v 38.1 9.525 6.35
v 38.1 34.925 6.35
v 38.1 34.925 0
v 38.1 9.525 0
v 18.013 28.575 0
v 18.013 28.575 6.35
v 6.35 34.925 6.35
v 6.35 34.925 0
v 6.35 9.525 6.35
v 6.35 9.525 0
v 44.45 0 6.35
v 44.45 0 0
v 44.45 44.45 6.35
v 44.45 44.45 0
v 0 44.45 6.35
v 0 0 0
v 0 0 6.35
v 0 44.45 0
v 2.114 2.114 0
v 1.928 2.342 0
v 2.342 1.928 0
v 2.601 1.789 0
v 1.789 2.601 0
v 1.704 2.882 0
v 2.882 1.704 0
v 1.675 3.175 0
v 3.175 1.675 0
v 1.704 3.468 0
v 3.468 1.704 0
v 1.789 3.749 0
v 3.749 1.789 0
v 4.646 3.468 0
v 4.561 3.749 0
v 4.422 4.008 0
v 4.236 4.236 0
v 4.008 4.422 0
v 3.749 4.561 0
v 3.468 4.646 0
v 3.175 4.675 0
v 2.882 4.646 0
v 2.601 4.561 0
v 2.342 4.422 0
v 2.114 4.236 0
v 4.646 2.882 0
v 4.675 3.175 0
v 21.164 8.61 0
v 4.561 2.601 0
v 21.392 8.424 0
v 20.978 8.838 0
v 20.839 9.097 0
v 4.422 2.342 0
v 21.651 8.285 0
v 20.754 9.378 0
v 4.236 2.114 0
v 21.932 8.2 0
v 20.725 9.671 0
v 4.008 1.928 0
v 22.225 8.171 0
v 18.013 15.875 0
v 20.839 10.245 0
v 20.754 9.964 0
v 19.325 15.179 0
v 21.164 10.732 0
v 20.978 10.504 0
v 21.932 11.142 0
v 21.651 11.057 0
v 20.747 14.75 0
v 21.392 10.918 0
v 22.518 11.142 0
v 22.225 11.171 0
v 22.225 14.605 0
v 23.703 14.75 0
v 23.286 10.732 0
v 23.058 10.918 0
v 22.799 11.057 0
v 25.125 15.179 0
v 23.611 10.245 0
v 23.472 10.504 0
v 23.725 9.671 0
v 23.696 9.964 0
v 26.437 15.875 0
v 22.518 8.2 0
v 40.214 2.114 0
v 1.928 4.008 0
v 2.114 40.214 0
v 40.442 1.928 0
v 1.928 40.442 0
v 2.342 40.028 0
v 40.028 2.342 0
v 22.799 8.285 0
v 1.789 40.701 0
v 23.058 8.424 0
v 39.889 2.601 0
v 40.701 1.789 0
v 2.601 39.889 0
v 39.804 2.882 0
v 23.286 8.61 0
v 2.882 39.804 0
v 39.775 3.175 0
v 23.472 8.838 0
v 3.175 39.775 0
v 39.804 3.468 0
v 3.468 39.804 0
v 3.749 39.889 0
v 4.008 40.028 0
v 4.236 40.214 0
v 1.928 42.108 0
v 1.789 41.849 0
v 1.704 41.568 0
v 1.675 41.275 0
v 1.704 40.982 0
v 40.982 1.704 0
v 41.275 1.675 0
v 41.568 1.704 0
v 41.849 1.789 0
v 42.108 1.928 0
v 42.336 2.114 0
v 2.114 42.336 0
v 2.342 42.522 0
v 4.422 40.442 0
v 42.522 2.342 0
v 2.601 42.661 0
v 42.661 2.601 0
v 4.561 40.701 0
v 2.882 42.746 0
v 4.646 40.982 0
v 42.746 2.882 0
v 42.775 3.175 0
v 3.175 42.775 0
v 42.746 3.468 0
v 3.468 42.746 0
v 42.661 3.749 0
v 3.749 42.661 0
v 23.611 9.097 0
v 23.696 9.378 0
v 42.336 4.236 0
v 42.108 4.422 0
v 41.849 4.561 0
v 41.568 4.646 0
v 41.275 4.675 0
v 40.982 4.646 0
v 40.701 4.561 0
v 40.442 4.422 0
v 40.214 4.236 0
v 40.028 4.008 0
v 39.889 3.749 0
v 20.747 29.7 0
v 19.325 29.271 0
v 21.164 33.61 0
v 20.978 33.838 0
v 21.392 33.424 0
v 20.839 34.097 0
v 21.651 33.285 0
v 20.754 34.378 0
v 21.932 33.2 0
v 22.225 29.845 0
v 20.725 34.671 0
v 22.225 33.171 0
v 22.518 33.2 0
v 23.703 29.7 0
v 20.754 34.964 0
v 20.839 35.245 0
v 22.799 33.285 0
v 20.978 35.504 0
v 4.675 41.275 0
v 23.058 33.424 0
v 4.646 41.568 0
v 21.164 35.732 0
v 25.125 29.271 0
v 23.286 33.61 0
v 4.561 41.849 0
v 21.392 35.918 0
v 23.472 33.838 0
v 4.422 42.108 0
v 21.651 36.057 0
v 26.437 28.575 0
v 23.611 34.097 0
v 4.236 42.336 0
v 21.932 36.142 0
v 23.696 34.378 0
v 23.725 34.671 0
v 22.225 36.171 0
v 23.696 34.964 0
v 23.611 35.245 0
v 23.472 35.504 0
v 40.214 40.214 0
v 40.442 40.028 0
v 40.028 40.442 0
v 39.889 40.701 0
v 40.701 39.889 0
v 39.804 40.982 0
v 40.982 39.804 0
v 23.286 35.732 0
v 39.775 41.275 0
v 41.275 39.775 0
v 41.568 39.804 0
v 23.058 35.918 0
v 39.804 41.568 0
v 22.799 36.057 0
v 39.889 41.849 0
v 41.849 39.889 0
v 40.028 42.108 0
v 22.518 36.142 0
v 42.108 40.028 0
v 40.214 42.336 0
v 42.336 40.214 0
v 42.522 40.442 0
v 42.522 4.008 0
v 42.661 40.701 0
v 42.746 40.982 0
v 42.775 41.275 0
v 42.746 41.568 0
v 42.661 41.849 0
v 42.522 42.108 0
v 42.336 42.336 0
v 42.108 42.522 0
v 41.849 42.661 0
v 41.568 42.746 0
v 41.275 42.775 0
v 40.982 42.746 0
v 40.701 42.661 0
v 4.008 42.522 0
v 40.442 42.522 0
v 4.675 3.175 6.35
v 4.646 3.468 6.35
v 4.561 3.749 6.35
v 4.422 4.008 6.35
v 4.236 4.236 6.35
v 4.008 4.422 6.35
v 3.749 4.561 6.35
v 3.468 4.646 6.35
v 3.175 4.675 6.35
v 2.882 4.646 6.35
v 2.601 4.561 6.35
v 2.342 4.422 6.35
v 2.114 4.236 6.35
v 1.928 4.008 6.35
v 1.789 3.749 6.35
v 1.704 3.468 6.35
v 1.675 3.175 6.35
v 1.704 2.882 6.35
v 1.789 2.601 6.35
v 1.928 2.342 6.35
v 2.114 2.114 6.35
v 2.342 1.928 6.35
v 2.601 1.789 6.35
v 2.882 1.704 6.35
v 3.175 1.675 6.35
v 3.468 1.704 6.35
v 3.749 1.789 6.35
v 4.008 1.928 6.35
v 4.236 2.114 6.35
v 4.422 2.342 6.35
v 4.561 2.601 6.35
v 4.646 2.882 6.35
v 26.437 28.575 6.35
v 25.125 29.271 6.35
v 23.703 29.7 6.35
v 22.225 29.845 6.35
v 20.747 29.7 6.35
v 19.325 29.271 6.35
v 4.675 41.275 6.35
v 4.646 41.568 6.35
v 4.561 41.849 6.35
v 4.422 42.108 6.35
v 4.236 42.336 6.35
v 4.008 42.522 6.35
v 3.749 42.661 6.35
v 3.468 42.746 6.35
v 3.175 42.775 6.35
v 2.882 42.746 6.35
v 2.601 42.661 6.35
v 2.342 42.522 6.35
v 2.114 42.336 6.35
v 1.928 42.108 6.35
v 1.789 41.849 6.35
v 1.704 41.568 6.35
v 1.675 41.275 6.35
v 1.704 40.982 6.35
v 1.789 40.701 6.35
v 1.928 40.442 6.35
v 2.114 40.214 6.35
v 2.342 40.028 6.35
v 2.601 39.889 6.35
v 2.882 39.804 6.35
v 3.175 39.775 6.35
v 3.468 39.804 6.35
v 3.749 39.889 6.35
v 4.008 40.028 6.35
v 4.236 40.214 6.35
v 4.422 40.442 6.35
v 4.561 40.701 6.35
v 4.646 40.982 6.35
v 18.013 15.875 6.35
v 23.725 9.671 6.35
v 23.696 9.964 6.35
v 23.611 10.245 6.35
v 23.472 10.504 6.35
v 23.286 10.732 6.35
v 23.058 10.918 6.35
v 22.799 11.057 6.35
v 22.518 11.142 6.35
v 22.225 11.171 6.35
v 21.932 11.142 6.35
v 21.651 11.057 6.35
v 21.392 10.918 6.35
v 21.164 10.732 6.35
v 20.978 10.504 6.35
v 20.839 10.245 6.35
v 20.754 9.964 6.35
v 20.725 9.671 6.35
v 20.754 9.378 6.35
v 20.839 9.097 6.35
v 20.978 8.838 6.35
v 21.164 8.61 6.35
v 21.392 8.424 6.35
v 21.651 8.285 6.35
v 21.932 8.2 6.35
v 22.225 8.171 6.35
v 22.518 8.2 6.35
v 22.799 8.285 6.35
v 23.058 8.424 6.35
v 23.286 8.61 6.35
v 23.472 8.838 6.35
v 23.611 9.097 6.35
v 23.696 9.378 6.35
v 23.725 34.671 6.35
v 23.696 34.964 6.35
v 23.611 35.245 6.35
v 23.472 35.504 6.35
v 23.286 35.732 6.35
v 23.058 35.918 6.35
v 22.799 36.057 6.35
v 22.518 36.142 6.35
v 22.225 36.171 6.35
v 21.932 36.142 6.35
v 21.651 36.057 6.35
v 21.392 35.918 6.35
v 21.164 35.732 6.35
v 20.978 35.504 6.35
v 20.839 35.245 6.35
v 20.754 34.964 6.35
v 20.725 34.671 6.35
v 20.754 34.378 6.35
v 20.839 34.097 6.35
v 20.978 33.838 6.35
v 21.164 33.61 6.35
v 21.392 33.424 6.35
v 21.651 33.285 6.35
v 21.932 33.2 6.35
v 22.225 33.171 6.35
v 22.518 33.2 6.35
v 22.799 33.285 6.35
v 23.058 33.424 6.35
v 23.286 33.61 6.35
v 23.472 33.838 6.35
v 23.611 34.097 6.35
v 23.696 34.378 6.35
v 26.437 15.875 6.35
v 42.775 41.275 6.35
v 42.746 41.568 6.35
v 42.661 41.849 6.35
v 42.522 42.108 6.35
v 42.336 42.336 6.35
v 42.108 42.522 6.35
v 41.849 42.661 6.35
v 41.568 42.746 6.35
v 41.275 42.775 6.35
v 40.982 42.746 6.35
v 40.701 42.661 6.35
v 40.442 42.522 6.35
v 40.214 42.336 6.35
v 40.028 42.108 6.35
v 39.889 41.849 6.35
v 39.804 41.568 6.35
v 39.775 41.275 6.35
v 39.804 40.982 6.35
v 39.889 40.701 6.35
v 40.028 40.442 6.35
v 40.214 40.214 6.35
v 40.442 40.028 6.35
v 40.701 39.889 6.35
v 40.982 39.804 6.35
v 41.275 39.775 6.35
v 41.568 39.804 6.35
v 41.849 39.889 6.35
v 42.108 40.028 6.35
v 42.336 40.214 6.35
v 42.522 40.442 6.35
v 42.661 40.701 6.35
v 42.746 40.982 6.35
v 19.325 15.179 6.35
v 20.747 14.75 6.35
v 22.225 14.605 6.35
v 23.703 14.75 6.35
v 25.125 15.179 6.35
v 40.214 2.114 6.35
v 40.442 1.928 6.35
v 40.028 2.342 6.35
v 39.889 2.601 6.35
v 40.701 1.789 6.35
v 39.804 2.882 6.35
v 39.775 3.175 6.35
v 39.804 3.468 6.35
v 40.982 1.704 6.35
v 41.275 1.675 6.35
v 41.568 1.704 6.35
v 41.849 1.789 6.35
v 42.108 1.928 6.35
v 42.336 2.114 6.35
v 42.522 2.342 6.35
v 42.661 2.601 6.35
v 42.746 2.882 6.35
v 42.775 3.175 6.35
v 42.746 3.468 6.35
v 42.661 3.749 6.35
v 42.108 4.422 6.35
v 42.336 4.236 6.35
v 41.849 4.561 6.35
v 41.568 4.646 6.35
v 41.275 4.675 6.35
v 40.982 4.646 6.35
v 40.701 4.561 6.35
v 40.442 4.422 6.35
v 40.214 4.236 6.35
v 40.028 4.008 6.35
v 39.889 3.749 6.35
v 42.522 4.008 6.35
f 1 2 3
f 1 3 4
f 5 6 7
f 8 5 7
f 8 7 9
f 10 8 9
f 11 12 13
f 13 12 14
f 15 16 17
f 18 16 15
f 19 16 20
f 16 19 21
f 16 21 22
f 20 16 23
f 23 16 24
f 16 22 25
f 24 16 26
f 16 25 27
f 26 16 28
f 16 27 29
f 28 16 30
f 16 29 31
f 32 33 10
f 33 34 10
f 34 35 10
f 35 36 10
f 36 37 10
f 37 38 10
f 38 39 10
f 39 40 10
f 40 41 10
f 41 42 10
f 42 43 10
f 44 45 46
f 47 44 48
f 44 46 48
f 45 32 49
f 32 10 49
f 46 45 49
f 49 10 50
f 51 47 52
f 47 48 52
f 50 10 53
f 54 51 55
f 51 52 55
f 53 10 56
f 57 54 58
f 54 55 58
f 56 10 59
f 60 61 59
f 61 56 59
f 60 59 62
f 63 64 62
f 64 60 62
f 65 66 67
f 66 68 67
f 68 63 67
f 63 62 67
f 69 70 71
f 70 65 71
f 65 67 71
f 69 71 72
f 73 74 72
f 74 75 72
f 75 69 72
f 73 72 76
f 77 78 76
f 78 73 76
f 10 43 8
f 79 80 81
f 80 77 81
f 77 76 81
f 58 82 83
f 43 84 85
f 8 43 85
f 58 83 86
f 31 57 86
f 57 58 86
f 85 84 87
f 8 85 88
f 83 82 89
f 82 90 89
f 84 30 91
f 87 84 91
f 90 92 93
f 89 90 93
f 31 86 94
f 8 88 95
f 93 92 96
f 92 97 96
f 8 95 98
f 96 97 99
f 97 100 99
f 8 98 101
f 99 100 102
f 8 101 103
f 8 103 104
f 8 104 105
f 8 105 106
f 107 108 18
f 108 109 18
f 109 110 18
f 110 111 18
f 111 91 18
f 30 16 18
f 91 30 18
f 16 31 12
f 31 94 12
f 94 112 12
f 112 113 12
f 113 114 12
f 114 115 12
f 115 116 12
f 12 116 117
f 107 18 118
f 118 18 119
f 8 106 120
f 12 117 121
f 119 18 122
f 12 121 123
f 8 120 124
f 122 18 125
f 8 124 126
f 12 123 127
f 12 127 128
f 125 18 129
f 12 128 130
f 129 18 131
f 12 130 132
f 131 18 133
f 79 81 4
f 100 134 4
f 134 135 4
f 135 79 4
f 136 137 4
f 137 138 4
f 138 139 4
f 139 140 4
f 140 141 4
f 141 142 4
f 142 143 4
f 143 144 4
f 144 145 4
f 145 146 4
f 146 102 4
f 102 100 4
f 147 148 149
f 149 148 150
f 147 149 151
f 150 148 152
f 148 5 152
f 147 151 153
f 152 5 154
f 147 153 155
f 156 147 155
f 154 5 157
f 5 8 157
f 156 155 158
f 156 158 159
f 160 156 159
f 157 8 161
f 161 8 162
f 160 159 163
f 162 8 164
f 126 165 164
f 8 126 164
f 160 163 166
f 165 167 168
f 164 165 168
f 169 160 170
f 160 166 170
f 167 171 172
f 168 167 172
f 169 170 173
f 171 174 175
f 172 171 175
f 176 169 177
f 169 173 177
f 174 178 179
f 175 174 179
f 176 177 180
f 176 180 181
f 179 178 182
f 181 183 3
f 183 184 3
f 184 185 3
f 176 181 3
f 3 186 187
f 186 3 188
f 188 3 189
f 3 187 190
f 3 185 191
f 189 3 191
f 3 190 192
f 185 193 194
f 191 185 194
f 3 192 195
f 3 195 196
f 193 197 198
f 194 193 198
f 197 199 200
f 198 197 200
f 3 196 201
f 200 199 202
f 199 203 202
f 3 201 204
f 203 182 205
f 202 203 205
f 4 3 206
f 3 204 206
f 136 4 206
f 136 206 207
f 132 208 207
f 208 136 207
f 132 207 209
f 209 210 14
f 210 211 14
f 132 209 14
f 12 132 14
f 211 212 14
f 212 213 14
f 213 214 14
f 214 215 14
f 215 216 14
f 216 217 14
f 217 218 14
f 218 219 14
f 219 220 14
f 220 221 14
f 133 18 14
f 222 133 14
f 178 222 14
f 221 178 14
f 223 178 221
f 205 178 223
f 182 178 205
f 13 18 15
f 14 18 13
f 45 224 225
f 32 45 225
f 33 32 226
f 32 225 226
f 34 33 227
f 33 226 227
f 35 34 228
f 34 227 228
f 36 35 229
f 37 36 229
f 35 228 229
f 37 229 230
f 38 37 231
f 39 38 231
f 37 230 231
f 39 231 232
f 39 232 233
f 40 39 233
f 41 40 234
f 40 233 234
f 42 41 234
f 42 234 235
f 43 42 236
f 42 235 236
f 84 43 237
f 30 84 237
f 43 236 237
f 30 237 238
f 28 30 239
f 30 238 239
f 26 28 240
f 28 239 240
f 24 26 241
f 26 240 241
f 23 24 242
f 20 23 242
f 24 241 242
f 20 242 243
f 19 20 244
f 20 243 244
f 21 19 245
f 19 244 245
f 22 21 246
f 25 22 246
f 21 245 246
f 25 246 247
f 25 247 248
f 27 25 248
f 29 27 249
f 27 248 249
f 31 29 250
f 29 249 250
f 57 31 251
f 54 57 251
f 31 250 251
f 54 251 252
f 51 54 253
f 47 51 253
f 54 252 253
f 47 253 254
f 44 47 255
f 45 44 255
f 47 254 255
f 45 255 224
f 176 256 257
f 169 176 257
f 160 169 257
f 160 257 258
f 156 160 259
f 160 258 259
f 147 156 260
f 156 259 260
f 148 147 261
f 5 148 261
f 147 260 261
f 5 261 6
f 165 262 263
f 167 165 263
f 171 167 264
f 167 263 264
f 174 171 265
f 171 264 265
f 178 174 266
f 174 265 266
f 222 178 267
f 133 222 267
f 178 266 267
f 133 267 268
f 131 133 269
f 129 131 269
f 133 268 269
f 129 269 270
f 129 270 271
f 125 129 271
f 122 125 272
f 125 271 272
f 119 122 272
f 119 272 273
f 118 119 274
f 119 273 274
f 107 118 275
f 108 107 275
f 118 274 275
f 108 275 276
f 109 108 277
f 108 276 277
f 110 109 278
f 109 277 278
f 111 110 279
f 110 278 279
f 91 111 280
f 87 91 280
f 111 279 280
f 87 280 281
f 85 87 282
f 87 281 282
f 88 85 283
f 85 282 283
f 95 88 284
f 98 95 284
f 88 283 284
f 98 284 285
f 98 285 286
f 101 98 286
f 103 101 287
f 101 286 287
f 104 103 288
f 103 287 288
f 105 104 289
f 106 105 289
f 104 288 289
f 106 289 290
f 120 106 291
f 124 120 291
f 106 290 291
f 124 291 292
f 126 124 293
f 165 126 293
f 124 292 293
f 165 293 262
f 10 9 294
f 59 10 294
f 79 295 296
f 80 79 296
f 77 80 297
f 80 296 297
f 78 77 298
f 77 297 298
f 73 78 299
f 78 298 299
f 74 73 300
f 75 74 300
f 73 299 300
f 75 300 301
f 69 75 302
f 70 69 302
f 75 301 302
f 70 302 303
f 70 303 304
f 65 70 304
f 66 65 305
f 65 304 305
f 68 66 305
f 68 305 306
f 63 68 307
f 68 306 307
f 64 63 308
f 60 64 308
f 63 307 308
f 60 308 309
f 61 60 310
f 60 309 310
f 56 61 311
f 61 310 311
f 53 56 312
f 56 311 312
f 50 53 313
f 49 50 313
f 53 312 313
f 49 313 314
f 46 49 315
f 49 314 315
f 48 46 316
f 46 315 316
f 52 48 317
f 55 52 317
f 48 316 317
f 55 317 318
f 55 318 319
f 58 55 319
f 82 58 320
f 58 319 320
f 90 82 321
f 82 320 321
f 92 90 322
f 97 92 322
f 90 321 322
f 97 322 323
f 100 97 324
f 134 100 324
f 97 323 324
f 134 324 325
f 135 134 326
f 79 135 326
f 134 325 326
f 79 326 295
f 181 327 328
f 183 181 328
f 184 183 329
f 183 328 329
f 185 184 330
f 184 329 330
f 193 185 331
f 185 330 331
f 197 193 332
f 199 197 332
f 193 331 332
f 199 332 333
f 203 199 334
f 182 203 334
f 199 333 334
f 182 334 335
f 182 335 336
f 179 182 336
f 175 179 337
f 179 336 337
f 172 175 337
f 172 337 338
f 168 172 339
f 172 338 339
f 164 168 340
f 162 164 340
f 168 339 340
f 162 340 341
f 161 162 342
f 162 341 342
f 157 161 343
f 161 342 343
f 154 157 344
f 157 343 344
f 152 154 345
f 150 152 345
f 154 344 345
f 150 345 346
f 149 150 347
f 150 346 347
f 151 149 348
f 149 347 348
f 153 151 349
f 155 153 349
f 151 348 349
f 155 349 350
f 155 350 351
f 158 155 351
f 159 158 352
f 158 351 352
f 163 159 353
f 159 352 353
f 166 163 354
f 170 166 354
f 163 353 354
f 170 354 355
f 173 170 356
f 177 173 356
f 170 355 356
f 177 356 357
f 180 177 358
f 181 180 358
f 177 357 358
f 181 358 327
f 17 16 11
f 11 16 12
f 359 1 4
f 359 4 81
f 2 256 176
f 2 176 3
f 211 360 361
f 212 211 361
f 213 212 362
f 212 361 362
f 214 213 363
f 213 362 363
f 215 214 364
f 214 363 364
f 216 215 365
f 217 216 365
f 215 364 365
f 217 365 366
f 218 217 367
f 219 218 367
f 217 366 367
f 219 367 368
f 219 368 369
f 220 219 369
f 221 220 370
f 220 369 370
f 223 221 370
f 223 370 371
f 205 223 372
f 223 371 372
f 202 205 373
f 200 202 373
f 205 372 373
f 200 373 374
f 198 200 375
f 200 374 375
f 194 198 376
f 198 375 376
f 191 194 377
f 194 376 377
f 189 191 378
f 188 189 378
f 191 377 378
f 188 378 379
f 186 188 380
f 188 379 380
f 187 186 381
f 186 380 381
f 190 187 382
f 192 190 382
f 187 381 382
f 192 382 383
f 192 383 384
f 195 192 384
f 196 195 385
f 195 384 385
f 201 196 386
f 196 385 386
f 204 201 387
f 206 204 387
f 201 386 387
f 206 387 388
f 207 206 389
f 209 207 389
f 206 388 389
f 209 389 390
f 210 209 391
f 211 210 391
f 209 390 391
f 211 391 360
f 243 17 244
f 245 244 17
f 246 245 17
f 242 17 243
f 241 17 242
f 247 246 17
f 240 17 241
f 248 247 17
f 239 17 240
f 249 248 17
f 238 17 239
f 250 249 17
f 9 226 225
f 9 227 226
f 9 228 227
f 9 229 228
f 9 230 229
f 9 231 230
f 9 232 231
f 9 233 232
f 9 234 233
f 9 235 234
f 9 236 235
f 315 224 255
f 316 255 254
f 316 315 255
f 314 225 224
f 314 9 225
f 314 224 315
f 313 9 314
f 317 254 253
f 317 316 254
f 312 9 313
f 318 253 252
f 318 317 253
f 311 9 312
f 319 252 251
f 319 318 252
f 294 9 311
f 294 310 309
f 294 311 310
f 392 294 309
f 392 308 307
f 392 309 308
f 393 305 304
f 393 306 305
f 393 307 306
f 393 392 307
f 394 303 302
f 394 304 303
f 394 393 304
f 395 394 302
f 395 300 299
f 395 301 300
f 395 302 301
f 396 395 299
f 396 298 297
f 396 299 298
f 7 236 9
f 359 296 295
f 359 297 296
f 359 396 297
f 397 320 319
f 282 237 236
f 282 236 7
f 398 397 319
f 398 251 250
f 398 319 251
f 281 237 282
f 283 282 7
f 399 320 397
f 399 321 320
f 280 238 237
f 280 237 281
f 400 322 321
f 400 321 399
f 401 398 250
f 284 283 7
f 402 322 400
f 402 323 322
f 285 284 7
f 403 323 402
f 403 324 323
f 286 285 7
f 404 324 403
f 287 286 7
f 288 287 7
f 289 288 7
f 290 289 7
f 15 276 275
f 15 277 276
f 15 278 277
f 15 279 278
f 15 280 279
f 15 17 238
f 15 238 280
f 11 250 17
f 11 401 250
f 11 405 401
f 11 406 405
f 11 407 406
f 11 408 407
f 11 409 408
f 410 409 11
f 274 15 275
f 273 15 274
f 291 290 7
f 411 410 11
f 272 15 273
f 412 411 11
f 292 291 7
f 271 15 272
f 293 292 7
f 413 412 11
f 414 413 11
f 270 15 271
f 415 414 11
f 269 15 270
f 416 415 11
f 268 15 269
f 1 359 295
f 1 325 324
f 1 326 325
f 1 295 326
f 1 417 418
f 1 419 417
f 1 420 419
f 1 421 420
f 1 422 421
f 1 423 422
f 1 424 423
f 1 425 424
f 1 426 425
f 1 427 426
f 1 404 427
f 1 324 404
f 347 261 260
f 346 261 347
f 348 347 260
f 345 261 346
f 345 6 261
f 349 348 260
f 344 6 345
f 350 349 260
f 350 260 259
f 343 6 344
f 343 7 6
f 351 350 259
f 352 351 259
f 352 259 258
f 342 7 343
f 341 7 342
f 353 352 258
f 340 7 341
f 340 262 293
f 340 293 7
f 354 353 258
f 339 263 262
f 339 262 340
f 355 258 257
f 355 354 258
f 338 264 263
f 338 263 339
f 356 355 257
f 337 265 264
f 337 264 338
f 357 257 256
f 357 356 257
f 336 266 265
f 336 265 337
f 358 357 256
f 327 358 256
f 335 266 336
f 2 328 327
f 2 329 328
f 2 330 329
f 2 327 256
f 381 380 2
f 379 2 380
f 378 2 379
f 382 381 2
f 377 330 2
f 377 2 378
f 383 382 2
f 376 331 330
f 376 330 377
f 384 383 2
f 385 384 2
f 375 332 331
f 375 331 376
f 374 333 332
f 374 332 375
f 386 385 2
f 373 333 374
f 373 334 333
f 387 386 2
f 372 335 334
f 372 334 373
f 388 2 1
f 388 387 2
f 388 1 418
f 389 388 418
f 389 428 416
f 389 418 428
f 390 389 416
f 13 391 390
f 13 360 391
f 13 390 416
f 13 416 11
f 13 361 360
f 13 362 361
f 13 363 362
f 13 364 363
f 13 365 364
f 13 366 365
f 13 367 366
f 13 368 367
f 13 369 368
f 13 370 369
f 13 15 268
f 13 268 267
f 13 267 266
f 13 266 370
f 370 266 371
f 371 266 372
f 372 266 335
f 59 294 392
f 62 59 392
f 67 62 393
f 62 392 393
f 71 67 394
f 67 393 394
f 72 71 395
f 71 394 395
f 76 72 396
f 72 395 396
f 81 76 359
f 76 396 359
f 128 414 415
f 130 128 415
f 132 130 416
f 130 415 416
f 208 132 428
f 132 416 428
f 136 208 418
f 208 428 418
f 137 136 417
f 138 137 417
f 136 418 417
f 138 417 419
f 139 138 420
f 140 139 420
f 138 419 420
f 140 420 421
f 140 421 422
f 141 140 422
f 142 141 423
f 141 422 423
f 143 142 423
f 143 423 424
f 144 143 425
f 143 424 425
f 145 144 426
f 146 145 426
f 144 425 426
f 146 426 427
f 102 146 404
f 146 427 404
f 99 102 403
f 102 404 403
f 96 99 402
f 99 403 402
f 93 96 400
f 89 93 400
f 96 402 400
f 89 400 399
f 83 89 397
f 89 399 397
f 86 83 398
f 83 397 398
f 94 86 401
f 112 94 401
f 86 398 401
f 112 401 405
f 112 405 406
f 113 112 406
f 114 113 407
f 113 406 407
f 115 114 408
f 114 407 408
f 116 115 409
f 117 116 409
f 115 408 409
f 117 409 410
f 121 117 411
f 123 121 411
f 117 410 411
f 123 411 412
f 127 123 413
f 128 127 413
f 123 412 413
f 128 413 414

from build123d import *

# Parameters (mm, degrees)
SKETCH1_W           = 44.45
SKETCH1_H           = 44.45
BOSS_EXTRUDE1_DEPTH = 6.35
SKETCH2_R           = 1.5
CUT_EXTRUDE2_DEPTH  = 6.35
SKETCH3_R           = 7.62
CUT_EXTRUDE3_DEPTH  = 6.35
SKETCH4_R           = 1.5
CUT_EXTRUDE4_DEPTH  = 6.35
CUT_EXTRUDE5_DEPTH  = 6.35


with BuildPart() as part:
    # Sketch1 → Boss-Extrude1 (new body)
    with BuildSketch(Plane.XY):
        with Locations((22.225, 22.225)):
            Rectangle(SKETCH1_W, SKETCH1_H)
    extrude(amount=BOSS_EXTRUDE1_DEPTH)

    # Sketch2 → Cut-Extrude2 (cut)
    with BuildSketch(Plane.XY.offset(6.35)):
        with Locations((22.225, 34.671)):
            Circle(SKETCH2_R)
        with Locations((22.225, 9.671)):
            Circle(SKETCH2_R)
    extrude(amount=-CUT_EXTRUDE2_DEPTH, mode=Mode.SUBTRACT)

    # Sketch3 → Cut-Extrude3 (cut)
    with BuildSketch(Plane.XY.offset(6.35)):
        with Locations((22.225, 22.225)):
            Circle(SKETCH3_R)
    extrude(amount=-CUT_EXTRUDE3_DEPTH, mode=Mode.SUBTRACT)

    # Sketch4 → Cut-Extrude4 (cut)
    with BuildSketch(Plane.XY.offset(6.35)):
        with Locations((3.175, 41.275)):
            Circle(SKETCH4_R)
        with Locations((41.275, 41.275)):
            Circle(SKETCH4_R)
        with Locations((41.275, 3.175)):
            Circle(SKETCH4_R)
        with Locations((3.175, 3.175)):
            Circle(SKETCH4_R)
    extrude(amount=-CUT_EXTRUDE4_DEPTH, mode=Mode.SUBTRACT)

    # Sketch7 → Cut-Extrude5 (cut)
    with BuildSketch(Plane.XY.offset(6.35)):
        with BuildLine():
            Line((38.1, 34.925), (38.1, 9.525))
            Line((38.1, 9.525), (26.437113484, 15.875))
            ThreePointArc((26.437113484, 15.875), (29.845, 22.225), (26.437113484, 28.575))
            Line((26.437113484, 28.575), (38.1, 34.925))
        make_face()
        with BuildLine():
            Line((6.35, 9.525), (18.012886516, 15.875))
            ThreePointArc((18.012886516, 15.875), (14.605, 22.225), (18.012886516, 28.575))
            Line((18.012886516, 28.575), (6.35, 34.925))
            Line((6.35, 34.925), (6.35, 9.525))
        make_face()
    extrude(amount=-CUT_EXTRUDE5_DEPTH, mode=Mode.SUBTRACT)


solid = part.part
